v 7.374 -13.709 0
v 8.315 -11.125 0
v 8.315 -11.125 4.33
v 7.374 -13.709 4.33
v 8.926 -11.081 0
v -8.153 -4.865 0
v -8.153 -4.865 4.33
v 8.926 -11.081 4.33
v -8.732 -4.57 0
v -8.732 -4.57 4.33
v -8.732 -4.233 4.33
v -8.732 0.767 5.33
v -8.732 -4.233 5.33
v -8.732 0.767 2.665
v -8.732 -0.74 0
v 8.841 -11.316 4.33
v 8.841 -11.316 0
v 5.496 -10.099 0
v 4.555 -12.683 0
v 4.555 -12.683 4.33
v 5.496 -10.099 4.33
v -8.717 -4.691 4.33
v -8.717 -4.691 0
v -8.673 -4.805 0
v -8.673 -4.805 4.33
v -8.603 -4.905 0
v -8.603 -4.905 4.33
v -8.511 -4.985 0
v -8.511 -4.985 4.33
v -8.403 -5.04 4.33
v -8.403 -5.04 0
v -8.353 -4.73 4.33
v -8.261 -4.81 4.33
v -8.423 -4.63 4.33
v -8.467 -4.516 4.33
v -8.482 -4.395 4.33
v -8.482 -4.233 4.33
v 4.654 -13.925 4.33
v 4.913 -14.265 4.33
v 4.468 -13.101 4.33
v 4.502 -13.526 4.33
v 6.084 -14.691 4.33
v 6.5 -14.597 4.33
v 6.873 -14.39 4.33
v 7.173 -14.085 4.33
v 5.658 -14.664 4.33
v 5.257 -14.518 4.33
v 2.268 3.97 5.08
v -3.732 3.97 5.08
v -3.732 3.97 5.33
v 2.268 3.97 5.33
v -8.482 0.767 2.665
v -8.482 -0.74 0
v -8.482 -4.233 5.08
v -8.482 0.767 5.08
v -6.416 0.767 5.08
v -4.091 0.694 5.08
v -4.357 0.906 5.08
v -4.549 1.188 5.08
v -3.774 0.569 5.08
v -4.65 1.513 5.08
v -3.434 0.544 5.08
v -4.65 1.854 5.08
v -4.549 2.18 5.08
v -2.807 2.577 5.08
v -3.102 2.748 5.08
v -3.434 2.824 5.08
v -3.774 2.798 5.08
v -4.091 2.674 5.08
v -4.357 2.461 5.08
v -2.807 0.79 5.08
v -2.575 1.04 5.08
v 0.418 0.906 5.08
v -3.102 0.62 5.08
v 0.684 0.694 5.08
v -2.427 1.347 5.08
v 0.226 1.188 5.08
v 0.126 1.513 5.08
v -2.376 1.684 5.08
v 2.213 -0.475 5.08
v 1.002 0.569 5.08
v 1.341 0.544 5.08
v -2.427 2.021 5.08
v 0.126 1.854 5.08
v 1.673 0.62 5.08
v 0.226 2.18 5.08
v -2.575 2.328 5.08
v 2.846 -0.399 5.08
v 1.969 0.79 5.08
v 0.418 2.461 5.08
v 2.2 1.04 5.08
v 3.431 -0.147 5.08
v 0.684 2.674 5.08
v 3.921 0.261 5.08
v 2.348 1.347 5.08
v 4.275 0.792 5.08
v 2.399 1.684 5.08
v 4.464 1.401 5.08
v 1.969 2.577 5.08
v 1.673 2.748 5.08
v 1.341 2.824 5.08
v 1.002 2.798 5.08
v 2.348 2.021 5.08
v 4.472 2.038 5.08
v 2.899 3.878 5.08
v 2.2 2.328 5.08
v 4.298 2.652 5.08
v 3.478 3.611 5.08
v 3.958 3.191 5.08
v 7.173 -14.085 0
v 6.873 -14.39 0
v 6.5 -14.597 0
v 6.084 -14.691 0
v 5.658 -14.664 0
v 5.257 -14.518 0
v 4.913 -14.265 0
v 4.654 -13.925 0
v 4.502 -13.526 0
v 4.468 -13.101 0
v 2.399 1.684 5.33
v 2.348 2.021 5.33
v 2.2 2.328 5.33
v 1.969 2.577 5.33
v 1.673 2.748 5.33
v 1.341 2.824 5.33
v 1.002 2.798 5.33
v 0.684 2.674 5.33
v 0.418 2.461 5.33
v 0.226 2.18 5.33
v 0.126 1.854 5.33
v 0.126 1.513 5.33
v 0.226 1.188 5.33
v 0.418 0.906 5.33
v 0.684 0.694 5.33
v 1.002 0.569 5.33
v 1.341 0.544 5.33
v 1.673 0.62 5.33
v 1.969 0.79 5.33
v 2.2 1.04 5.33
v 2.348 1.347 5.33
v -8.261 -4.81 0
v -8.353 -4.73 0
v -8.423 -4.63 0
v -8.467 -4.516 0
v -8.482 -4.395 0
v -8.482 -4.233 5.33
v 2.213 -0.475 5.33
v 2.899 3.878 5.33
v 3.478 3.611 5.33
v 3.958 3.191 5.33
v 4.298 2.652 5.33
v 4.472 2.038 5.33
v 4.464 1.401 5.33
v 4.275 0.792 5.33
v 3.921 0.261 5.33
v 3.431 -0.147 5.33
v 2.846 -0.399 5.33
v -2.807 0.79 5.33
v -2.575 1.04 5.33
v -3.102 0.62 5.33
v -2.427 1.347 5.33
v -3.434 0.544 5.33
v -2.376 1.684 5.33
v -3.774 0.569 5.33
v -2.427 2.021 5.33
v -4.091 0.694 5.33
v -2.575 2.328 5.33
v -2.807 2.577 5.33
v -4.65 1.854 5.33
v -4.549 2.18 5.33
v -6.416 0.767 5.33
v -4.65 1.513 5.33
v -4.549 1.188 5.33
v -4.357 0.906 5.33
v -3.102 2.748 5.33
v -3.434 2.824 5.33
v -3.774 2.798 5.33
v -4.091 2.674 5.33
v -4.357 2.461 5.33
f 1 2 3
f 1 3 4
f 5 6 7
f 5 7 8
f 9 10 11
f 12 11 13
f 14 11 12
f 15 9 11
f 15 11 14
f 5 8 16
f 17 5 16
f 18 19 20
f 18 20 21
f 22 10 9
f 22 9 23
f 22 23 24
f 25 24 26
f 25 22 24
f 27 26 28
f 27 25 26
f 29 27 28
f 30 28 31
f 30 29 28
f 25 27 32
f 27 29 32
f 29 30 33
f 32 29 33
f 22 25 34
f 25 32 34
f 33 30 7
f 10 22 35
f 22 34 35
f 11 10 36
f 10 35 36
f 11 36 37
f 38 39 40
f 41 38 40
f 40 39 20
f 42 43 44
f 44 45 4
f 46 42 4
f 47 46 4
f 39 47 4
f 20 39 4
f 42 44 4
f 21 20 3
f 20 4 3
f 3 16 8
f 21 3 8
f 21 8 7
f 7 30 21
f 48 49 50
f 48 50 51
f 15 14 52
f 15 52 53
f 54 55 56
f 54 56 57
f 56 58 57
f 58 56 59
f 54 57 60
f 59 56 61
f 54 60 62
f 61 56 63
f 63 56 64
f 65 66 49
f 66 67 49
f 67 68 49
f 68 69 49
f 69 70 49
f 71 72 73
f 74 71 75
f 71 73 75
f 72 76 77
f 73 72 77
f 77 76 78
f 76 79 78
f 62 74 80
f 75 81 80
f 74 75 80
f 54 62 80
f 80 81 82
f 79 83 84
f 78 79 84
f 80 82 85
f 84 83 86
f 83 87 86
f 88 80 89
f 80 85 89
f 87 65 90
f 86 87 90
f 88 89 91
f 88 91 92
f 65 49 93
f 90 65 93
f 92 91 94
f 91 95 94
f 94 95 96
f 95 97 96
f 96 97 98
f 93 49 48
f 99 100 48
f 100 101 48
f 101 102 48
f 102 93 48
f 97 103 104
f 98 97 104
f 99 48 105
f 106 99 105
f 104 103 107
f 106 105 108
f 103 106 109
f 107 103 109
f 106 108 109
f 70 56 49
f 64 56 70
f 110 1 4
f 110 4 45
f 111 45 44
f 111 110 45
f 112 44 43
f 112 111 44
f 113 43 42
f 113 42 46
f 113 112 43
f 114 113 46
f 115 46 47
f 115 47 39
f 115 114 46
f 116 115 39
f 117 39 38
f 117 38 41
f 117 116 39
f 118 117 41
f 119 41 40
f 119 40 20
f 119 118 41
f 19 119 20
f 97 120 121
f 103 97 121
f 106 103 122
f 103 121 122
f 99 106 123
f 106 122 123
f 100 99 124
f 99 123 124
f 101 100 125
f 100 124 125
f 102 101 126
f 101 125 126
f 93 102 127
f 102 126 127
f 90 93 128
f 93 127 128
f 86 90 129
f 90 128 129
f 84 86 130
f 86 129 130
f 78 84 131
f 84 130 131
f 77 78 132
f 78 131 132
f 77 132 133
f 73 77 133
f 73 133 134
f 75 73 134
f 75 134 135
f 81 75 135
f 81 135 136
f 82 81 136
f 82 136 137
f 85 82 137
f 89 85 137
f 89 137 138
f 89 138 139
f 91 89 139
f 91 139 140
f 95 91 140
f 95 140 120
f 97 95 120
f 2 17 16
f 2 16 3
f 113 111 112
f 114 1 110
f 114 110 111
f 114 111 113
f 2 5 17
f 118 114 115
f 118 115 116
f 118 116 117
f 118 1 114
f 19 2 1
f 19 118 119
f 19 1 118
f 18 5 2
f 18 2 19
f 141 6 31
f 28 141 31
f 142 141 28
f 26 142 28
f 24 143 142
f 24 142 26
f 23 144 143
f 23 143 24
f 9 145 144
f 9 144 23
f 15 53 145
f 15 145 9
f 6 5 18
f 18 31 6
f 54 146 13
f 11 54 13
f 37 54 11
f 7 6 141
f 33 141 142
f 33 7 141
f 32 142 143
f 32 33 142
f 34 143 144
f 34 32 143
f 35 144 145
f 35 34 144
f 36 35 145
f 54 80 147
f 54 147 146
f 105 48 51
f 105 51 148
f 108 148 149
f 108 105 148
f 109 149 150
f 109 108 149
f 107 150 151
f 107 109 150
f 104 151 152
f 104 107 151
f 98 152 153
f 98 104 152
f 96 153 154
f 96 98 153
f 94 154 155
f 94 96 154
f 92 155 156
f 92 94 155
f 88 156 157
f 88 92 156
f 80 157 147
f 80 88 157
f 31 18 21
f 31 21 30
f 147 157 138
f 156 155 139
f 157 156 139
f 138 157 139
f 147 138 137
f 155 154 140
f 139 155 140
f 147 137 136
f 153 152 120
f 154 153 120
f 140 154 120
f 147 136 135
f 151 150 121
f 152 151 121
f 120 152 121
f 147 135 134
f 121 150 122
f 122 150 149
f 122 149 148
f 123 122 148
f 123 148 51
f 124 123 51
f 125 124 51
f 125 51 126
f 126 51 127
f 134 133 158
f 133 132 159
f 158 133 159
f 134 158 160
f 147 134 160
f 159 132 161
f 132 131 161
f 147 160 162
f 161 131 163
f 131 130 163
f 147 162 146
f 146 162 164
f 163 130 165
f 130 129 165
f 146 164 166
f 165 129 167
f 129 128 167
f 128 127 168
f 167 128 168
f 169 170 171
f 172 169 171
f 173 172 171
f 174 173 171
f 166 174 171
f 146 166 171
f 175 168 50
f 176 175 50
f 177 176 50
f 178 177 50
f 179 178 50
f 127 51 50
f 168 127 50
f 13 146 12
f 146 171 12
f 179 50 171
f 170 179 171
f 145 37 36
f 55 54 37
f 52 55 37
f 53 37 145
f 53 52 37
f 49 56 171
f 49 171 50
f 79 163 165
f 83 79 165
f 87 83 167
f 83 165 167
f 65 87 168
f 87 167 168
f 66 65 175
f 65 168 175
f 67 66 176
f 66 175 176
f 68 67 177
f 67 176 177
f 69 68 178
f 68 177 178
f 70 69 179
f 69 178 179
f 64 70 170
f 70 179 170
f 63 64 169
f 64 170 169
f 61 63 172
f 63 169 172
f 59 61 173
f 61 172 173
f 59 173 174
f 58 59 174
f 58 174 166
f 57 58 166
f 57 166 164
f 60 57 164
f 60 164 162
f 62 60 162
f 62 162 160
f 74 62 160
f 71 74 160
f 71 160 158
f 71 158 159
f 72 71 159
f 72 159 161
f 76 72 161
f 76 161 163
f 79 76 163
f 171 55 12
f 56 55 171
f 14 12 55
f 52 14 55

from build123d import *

# Parameters (mm, degrees)
EXTRUDE_1_DEPTH     = 5.33
SKETCH_3_W          = 18.524948115
SKETCH_3_H          = 1
CUT_EXTRUDE_2_DEPTH = 8
SKETCH_4_R          = 1.143
CUT_EXTRUDE_3_DEPTH = 8
SKETCH_5_W          = 14.906487706
SKETCH_5_H          = 5.08
CUT_EXTRUDE_4_DEPTH = 8.5
FILLET_1_R          = 0.5
SKETCH_6_W          = 1
SKETCH_6_H          = 0.794629951
CUT_EXTRUDE_5_DEPTH = 8.5
CUT_EXTRUDE_6_DEPTH = 8.5


with BuildPart() as part:
    # Эскиз1 → Бобышка-Вытянуть1 (new body)
    with BuildSketch(Plane.XY):
        with BuildLine():
            Line((-3.73172272, 3.969749711), (2.26827728, 3.969749711))
            ThreePointArc((2.26827728, 3.969749711), (4.49077728, 1.719238545), (2.212607957, -0.474901673))
            Line((2.212607957, -0.474901673), (-8.48172272, -4.233380934))
            Line((-8.48172272, -4.233380934), (-8.48172272, -4.745198404))
            Line((-8.48172272, -4.745198404), (8.926034324, -11.081103814))
            Line((8.926034324, -11.081103814), (8.840529289, -11.316026969))
            Line((8.840529289, -11.316026969), (8.31500946, -11.124753394))
            Line((8.31500946, -11.124753394), (7.374454066, -13.708908101))
            ThreePointArc((7.374454066, -13.708908101), (5.45188492, -14.605416817), (4.555376204, -12.682847671))
            Line((4.555376204, -12.682847671), (5.495931598, -10.098692964))
            Line((5.495931598, -10.098692964), (-8.73172272, -4.920250289))
            Line((-8.73172272, -4.920250289), (-8.73172272, 0.766619066))
            Line((-8.73172272, 0.766619066), (-6.416304518, 0.766619066))
            Line((-6.416304518, 0.766619066), (-3.73172272, 3.969749711))
        make_face()
    extrude(amount=EXTRUDE_1_DEPTH)

    # Эскиз3 → Вырез-Вытянуть2 (cut)
    with BuildSketch(Plane(origin=(-2.517250451, -6.916088773, 0), x_dir=(0.9396926207859082, -0.34202014332566943, 0), z_dir=(0.34202014332566943, 0.9396926207859082, 0))):
        with Locations((2.915215245, -4.83)):
            Rectangle(SKETCH_3_W, SKETCH_3_H)
    extrude(amount=-CUT_EXTRUDE_2_DEPTH, mode=Mode.SUBTRACT)

    # Эскиз4 → Вырез-Вытянуть3 (cut)
    with BuildSketch(Plane.XY.offset(5.33)):
        with Locations((-3.51932272, 1.683749711)):
            Circle(SKETCH_4_R)
        with Locations((1.25587728, 1.683749711)):
            Circle(SKETCH_4_R)
    extrude(amount=-CUT_EXTRUDE_3_DEPTH, mode=Mode.SUBTRACT)

    # Эскиз5 → Вырез-Вытянуть4 (cut)
    with BuildSketch(Plane(origin=(0, 3.969749711, 0), x_dir=(1, 0, 0), z_dir=(0, 1, 0))):
        with Locations((-1.028478867, -2.54)):
            Rectangle(SKETCH_5_W, SKETCH_5_H)
    extrude(amount=-CUT_EXTRUDE_4_DEPTH, mode=Mode.SUBTRACT)

    # Скругление1
    fillet_1_edges = [part.edges().sort_by_distance(p)[0] for p in [
        (-8.48172272, -4.745198404, 2.165),
        (-8.73172272, -4.920250289, 2.665),
    ]]
    fillet(fillet_1_edges, radius=FILLET_1_R)

    # Эскиз6 → Вырез-Вытянуть5 (cut)
    with BuildSketch(Plane(origin=(-8.48172272, 0, 0), x_dir=(0, 0, -1), z_dir=(1, 0, 0))):
        with Locations((-4.83, -4.630695909)):
            Rectangle(SKETCH_6_W, SKETCH_6_H)
    extrude(amount=-CUT_EXTRUDE_5_DEPTH, mode=Mode.SUBTRACT)

    # Эскиз7 → Вырез-Вытянуть6 (cut)
    with BuildSketch(Plane.ZY.offset(8.73172272)):
        Polygon((2.665, 0.766619066), (0, -0.740228), (0, 0.766619066), align=None)
    extrude(amount=-CUT_EXTRUDE_6_DEPTH, mode=Mode.SUBTRACT)


solid = part.part
